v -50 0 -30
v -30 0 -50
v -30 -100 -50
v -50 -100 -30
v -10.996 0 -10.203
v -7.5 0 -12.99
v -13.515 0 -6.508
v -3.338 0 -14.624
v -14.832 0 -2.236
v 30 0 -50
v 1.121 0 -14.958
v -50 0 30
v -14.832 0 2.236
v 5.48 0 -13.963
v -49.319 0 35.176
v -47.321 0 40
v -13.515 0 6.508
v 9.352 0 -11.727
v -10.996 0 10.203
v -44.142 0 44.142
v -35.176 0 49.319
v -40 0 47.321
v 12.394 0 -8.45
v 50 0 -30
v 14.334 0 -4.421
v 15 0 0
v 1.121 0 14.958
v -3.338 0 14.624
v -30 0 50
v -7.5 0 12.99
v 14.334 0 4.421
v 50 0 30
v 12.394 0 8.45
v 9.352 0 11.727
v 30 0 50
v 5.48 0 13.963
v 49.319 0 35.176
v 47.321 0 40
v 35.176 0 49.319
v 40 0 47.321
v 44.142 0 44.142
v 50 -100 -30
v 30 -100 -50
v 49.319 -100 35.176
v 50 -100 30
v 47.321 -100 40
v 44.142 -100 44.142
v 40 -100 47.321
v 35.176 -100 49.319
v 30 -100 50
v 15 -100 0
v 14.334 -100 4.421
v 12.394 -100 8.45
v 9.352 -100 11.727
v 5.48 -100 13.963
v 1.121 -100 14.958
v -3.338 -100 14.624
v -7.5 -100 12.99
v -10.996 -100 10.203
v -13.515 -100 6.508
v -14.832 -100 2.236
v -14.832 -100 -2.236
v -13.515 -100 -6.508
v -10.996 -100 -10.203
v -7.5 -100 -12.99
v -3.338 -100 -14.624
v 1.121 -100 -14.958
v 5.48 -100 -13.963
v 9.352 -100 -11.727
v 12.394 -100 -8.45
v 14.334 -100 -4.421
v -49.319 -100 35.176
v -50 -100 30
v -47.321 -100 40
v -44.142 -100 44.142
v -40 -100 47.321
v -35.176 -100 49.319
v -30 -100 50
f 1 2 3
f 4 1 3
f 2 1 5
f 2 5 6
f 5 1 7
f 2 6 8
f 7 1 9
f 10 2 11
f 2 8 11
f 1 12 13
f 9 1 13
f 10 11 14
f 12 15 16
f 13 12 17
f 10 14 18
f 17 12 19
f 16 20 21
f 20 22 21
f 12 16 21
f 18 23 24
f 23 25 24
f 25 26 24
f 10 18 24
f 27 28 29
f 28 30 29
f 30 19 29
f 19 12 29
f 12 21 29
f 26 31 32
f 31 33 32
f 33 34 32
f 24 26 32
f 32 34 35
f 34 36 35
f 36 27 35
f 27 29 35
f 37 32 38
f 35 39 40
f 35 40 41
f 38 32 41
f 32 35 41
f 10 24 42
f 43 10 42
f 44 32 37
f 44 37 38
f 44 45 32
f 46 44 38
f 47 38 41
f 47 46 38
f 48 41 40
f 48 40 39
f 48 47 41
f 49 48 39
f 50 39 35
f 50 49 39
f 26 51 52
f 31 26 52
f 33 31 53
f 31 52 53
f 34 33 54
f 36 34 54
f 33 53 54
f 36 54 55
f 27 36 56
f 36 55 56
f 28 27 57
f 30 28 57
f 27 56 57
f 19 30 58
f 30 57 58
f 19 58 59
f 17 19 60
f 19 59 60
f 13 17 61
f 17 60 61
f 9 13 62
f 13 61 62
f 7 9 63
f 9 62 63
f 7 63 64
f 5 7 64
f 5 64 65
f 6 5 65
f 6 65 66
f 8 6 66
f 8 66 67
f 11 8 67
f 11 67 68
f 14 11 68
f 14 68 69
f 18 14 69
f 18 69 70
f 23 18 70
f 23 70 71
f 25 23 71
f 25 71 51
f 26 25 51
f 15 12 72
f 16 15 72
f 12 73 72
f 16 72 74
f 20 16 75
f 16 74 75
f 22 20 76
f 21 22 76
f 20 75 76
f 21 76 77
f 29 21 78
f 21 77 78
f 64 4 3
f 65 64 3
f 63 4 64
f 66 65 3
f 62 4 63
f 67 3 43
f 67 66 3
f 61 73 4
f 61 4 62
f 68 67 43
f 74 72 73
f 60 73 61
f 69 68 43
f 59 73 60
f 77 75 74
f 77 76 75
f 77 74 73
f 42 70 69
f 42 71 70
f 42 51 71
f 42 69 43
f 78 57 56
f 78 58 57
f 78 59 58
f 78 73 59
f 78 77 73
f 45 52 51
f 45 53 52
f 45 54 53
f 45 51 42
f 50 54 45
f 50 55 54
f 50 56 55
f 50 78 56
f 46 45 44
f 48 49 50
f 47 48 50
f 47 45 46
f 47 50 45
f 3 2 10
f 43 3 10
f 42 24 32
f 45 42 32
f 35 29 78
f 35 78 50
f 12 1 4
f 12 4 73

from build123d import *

# Parameters (mm, degrees)
F0_W     = 100
F0_H     = 100
F1_DEPTH = 100
F2_R     = 20
F3_SIZE  = 20
F4_R     = 15
F5_DEPTH = 100.001


with BuildPart() as f1:
    # F0 (on Front) → F1 (new body)
    with BuildSketch(Plane.XZ):
        Rectangle(F0_W, F0_H)
    extrude(amount=F1_DEPTH)

    # F2
    f2_edges = [f1.edges().sort_by_distance(p)[0] for p in [
        (-50, -50, 50),
        (50, -50, 50),
    ]]
    fillet(f2_edges, radius=F2_R)

    # F3
    f3_edges = [f1.edges().sort_by_distance(p)[0] for p in [
        (50, -50, -50),
        (-50, -50, -50),
    ]]
    chamfer(f3_edges, length=F3_SIZE)

    # F4 (on face) → F5 (cut, through all)
    with BuildSketch(Plane.XZ.offset(100)):
        Circle(F4_R)
    extrude(amount=-F5_DEPTH, mode=Mode.SUBTRACT)


solid = f1.part
